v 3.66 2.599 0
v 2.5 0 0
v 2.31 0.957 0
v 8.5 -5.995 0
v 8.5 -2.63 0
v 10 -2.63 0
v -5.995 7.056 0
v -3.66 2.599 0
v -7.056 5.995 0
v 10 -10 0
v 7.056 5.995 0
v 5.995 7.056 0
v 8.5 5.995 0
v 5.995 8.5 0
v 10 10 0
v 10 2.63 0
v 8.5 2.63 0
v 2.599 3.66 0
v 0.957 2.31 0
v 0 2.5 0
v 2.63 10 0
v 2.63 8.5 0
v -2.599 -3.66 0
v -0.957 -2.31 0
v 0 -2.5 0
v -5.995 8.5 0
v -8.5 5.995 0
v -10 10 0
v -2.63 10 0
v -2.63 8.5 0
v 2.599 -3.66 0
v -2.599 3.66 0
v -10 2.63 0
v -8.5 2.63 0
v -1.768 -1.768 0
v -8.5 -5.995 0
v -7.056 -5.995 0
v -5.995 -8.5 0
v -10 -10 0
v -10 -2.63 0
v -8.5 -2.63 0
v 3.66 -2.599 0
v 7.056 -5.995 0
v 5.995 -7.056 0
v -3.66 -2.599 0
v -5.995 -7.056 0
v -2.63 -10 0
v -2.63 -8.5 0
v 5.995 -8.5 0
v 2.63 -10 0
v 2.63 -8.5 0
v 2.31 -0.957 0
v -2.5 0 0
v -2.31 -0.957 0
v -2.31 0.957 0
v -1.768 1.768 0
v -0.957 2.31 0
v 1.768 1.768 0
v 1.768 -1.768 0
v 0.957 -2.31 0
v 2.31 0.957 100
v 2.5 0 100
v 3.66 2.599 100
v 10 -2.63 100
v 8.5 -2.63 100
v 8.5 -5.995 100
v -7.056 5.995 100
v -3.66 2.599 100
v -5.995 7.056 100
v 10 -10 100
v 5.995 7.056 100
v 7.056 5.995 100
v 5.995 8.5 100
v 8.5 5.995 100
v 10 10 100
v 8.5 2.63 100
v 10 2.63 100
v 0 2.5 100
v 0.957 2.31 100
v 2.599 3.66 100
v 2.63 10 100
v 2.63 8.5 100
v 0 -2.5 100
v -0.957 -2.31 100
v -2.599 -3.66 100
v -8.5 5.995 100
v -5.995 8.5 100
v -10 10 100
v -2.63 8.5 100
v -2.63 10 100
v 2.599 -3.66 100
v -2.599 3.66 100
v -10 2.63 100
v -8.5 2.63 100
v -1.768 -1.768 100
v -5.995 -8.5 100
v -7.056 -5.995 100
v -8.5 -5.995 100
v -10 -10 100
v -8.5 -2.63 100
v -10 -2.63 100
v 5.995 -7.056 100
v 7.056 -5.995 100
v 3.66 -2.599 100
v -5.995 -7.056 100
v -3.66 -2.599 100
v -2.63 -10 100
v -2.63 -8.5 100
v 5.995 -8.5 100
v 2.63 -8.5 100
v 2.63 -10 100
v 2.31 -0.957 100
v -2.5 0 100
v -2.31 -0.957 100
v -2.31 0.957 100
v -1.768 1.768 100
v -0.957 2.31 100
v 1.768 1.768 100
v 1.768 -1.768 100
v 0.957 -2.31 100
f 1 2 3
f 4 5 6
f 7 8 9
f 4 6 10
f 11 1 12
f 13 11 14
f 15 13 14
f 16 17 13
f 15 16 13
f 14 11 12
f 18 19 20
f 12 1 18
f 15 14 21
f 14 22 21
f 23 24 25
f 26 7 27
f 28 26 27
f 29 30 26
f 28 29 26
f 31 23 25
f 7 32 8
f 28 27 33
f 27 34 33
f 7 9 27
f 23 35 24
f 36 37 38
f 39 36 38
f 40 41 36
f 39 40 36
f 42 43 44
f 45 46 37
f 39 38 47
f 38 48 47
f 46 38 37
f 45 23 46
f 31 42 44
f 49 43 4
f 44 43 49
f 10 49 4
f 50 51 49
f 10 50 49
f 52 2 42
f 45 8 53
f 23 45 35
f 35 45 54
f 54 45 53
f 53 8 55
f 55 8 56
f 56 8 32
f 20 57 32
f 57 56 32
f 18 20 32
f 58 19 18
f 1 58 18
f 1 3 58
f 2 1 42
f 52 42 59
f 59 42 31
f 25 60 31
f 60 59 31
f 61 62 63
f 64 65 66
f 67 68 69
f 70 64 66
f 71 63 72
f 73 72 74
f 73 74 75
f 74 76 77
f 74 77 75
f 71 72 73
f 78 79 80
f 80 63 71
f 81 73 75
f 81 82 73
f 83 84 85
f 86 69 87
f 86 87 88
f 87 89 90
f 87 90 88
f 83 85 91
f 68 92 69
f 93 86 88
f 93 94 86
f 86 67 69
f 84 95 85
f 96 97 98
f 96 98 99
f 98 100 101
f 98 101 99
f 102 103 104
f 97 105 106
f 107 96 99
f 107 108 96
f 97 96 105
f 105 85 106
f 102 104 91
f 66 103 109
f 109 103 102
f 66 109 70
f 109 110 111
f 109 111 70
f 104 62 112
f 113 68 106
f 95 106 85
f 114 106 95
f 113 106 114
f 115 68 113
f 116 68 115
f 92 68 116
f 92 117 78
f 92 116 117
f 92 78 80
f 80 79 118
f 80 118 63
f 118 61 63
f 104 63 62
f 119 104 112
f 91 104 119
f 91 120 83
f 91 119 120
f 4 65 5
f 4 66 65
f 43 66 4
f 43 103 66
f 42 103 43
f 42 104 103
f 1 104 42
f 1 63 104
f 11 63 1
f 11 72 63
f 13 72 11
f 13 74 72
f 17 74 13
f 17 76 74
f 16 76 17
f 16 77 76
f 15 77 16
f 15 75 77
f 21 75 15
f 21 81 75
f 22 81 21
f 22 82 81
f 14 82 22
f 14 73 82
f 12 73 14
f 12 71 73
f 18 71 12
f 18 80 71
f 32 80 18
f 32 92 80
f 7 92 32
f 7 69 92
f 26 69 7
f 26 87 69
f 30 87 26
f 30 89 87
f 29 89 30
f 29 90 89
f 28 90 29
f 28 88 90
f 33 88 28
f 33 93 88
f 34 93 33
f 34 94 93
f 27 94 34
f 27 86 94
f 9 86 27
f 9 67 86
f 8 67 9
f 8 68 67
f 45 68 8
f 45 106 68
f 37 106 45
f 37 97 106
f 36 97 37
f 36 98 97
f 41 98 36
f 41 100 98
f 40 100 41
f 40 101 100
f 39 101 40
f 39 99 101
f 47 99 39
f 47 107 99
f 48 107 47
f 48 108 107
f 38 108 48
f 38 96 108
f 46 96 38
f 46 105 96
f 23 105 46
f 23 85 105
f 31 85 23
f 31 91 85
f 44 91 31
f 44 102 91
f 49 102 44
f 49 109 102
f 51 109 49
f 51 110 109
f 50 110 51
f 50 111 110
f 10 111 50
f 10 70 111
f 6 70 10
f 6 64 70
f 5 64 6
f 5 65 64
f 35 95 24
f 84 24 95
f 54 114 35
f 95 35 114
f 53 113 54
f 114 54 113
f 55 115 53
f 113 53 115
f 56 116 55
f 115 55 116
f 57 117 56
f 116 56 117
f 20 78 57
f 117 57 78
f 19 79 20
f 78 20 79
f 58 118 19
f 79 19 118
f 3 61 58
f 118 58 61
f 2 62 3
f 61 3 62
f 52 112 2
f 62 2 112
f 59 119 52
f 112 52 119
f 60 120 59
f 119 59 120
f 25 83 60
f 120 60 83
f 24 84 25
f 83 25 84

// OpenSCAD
/* ***INFO***
 * Author: slurked
 * Email: slurked@starlid.com
 * Version: 1.0
 * License: Creative Commons Zero (https://creativecommons.org/publicdomain/zero/1.0)
 *
 ***TO INSTALL***
 *  To use, place this file in your OpenSCAD libraries directory. 
 *  If you don't know where this is on your computer, go to the 
 *  file menu and select "Show Library Folder" or check 
 *  https://en.wikibooks.org/wiki/OpenSCAD_User_Manual/Libraries
 *
 *
 ***USAGE EXAMPLE***
 * This generates a 75mm tall 2020 extrusion:
 *
 *   use <2020_profile.scad>
 *   linear_extrude(height=75) 2020_profile();
 *
 *
 ***NOTES***
 * Please be aware that there are many different variations in real 
 * world aluminum extrusions. Differences in tolerances, minor details 
 * like corner bevels, and even major variations in the interior cross section 
 * are common. This particular model is very basic with square edges.
 * 
 * This is a trivial item, so I have elected to release it into the public 
 * domain via the Creative Commons Zero license. No credit, attribution, 
 * or permission is needed from me to use this work. Although I would still 
 * enjoy hearing about what you put it to use for!
 *
 *****/

// ====================================================================
//  Private
// ====================================================================

module 2020_profile_1(){
    difference(){
        
        square([20,20],center=true);
        square([17,17],center=true);

        square([40,5.26],center=true);
        rotate([0,0,90]) square([40,5.26],center=true);
    }

    difference(){
        union(){
            square([7.32,7.32],center=true); 
            rotate([0,0,45]) square([1.5,25],center=true);
            rotate([0,0,-45]) square([1.5,25],center=true);
        }
        circle(d=5,$fn=16);
    }

    translate([7.9975,7.9975,0]) square([4.005,4.005],center=true);
    translate([-7.9975,7.9975,0]) square([4.005,4.005],center=true);
    translate([7.9975,-7.9975,0]) square([4.005,4.005],center=true);
    translate([-7.9975,-7.9975,0]) square([4.005,4.005],center=true);
}

// ====================================================================
//  Public
// ====================================================================

module 2020_profile(height) {
    linear_extrude(height) 2020_profile_1();
}

// ====================================================================
//  Example
// ====================================================================

2020_profile(100);
